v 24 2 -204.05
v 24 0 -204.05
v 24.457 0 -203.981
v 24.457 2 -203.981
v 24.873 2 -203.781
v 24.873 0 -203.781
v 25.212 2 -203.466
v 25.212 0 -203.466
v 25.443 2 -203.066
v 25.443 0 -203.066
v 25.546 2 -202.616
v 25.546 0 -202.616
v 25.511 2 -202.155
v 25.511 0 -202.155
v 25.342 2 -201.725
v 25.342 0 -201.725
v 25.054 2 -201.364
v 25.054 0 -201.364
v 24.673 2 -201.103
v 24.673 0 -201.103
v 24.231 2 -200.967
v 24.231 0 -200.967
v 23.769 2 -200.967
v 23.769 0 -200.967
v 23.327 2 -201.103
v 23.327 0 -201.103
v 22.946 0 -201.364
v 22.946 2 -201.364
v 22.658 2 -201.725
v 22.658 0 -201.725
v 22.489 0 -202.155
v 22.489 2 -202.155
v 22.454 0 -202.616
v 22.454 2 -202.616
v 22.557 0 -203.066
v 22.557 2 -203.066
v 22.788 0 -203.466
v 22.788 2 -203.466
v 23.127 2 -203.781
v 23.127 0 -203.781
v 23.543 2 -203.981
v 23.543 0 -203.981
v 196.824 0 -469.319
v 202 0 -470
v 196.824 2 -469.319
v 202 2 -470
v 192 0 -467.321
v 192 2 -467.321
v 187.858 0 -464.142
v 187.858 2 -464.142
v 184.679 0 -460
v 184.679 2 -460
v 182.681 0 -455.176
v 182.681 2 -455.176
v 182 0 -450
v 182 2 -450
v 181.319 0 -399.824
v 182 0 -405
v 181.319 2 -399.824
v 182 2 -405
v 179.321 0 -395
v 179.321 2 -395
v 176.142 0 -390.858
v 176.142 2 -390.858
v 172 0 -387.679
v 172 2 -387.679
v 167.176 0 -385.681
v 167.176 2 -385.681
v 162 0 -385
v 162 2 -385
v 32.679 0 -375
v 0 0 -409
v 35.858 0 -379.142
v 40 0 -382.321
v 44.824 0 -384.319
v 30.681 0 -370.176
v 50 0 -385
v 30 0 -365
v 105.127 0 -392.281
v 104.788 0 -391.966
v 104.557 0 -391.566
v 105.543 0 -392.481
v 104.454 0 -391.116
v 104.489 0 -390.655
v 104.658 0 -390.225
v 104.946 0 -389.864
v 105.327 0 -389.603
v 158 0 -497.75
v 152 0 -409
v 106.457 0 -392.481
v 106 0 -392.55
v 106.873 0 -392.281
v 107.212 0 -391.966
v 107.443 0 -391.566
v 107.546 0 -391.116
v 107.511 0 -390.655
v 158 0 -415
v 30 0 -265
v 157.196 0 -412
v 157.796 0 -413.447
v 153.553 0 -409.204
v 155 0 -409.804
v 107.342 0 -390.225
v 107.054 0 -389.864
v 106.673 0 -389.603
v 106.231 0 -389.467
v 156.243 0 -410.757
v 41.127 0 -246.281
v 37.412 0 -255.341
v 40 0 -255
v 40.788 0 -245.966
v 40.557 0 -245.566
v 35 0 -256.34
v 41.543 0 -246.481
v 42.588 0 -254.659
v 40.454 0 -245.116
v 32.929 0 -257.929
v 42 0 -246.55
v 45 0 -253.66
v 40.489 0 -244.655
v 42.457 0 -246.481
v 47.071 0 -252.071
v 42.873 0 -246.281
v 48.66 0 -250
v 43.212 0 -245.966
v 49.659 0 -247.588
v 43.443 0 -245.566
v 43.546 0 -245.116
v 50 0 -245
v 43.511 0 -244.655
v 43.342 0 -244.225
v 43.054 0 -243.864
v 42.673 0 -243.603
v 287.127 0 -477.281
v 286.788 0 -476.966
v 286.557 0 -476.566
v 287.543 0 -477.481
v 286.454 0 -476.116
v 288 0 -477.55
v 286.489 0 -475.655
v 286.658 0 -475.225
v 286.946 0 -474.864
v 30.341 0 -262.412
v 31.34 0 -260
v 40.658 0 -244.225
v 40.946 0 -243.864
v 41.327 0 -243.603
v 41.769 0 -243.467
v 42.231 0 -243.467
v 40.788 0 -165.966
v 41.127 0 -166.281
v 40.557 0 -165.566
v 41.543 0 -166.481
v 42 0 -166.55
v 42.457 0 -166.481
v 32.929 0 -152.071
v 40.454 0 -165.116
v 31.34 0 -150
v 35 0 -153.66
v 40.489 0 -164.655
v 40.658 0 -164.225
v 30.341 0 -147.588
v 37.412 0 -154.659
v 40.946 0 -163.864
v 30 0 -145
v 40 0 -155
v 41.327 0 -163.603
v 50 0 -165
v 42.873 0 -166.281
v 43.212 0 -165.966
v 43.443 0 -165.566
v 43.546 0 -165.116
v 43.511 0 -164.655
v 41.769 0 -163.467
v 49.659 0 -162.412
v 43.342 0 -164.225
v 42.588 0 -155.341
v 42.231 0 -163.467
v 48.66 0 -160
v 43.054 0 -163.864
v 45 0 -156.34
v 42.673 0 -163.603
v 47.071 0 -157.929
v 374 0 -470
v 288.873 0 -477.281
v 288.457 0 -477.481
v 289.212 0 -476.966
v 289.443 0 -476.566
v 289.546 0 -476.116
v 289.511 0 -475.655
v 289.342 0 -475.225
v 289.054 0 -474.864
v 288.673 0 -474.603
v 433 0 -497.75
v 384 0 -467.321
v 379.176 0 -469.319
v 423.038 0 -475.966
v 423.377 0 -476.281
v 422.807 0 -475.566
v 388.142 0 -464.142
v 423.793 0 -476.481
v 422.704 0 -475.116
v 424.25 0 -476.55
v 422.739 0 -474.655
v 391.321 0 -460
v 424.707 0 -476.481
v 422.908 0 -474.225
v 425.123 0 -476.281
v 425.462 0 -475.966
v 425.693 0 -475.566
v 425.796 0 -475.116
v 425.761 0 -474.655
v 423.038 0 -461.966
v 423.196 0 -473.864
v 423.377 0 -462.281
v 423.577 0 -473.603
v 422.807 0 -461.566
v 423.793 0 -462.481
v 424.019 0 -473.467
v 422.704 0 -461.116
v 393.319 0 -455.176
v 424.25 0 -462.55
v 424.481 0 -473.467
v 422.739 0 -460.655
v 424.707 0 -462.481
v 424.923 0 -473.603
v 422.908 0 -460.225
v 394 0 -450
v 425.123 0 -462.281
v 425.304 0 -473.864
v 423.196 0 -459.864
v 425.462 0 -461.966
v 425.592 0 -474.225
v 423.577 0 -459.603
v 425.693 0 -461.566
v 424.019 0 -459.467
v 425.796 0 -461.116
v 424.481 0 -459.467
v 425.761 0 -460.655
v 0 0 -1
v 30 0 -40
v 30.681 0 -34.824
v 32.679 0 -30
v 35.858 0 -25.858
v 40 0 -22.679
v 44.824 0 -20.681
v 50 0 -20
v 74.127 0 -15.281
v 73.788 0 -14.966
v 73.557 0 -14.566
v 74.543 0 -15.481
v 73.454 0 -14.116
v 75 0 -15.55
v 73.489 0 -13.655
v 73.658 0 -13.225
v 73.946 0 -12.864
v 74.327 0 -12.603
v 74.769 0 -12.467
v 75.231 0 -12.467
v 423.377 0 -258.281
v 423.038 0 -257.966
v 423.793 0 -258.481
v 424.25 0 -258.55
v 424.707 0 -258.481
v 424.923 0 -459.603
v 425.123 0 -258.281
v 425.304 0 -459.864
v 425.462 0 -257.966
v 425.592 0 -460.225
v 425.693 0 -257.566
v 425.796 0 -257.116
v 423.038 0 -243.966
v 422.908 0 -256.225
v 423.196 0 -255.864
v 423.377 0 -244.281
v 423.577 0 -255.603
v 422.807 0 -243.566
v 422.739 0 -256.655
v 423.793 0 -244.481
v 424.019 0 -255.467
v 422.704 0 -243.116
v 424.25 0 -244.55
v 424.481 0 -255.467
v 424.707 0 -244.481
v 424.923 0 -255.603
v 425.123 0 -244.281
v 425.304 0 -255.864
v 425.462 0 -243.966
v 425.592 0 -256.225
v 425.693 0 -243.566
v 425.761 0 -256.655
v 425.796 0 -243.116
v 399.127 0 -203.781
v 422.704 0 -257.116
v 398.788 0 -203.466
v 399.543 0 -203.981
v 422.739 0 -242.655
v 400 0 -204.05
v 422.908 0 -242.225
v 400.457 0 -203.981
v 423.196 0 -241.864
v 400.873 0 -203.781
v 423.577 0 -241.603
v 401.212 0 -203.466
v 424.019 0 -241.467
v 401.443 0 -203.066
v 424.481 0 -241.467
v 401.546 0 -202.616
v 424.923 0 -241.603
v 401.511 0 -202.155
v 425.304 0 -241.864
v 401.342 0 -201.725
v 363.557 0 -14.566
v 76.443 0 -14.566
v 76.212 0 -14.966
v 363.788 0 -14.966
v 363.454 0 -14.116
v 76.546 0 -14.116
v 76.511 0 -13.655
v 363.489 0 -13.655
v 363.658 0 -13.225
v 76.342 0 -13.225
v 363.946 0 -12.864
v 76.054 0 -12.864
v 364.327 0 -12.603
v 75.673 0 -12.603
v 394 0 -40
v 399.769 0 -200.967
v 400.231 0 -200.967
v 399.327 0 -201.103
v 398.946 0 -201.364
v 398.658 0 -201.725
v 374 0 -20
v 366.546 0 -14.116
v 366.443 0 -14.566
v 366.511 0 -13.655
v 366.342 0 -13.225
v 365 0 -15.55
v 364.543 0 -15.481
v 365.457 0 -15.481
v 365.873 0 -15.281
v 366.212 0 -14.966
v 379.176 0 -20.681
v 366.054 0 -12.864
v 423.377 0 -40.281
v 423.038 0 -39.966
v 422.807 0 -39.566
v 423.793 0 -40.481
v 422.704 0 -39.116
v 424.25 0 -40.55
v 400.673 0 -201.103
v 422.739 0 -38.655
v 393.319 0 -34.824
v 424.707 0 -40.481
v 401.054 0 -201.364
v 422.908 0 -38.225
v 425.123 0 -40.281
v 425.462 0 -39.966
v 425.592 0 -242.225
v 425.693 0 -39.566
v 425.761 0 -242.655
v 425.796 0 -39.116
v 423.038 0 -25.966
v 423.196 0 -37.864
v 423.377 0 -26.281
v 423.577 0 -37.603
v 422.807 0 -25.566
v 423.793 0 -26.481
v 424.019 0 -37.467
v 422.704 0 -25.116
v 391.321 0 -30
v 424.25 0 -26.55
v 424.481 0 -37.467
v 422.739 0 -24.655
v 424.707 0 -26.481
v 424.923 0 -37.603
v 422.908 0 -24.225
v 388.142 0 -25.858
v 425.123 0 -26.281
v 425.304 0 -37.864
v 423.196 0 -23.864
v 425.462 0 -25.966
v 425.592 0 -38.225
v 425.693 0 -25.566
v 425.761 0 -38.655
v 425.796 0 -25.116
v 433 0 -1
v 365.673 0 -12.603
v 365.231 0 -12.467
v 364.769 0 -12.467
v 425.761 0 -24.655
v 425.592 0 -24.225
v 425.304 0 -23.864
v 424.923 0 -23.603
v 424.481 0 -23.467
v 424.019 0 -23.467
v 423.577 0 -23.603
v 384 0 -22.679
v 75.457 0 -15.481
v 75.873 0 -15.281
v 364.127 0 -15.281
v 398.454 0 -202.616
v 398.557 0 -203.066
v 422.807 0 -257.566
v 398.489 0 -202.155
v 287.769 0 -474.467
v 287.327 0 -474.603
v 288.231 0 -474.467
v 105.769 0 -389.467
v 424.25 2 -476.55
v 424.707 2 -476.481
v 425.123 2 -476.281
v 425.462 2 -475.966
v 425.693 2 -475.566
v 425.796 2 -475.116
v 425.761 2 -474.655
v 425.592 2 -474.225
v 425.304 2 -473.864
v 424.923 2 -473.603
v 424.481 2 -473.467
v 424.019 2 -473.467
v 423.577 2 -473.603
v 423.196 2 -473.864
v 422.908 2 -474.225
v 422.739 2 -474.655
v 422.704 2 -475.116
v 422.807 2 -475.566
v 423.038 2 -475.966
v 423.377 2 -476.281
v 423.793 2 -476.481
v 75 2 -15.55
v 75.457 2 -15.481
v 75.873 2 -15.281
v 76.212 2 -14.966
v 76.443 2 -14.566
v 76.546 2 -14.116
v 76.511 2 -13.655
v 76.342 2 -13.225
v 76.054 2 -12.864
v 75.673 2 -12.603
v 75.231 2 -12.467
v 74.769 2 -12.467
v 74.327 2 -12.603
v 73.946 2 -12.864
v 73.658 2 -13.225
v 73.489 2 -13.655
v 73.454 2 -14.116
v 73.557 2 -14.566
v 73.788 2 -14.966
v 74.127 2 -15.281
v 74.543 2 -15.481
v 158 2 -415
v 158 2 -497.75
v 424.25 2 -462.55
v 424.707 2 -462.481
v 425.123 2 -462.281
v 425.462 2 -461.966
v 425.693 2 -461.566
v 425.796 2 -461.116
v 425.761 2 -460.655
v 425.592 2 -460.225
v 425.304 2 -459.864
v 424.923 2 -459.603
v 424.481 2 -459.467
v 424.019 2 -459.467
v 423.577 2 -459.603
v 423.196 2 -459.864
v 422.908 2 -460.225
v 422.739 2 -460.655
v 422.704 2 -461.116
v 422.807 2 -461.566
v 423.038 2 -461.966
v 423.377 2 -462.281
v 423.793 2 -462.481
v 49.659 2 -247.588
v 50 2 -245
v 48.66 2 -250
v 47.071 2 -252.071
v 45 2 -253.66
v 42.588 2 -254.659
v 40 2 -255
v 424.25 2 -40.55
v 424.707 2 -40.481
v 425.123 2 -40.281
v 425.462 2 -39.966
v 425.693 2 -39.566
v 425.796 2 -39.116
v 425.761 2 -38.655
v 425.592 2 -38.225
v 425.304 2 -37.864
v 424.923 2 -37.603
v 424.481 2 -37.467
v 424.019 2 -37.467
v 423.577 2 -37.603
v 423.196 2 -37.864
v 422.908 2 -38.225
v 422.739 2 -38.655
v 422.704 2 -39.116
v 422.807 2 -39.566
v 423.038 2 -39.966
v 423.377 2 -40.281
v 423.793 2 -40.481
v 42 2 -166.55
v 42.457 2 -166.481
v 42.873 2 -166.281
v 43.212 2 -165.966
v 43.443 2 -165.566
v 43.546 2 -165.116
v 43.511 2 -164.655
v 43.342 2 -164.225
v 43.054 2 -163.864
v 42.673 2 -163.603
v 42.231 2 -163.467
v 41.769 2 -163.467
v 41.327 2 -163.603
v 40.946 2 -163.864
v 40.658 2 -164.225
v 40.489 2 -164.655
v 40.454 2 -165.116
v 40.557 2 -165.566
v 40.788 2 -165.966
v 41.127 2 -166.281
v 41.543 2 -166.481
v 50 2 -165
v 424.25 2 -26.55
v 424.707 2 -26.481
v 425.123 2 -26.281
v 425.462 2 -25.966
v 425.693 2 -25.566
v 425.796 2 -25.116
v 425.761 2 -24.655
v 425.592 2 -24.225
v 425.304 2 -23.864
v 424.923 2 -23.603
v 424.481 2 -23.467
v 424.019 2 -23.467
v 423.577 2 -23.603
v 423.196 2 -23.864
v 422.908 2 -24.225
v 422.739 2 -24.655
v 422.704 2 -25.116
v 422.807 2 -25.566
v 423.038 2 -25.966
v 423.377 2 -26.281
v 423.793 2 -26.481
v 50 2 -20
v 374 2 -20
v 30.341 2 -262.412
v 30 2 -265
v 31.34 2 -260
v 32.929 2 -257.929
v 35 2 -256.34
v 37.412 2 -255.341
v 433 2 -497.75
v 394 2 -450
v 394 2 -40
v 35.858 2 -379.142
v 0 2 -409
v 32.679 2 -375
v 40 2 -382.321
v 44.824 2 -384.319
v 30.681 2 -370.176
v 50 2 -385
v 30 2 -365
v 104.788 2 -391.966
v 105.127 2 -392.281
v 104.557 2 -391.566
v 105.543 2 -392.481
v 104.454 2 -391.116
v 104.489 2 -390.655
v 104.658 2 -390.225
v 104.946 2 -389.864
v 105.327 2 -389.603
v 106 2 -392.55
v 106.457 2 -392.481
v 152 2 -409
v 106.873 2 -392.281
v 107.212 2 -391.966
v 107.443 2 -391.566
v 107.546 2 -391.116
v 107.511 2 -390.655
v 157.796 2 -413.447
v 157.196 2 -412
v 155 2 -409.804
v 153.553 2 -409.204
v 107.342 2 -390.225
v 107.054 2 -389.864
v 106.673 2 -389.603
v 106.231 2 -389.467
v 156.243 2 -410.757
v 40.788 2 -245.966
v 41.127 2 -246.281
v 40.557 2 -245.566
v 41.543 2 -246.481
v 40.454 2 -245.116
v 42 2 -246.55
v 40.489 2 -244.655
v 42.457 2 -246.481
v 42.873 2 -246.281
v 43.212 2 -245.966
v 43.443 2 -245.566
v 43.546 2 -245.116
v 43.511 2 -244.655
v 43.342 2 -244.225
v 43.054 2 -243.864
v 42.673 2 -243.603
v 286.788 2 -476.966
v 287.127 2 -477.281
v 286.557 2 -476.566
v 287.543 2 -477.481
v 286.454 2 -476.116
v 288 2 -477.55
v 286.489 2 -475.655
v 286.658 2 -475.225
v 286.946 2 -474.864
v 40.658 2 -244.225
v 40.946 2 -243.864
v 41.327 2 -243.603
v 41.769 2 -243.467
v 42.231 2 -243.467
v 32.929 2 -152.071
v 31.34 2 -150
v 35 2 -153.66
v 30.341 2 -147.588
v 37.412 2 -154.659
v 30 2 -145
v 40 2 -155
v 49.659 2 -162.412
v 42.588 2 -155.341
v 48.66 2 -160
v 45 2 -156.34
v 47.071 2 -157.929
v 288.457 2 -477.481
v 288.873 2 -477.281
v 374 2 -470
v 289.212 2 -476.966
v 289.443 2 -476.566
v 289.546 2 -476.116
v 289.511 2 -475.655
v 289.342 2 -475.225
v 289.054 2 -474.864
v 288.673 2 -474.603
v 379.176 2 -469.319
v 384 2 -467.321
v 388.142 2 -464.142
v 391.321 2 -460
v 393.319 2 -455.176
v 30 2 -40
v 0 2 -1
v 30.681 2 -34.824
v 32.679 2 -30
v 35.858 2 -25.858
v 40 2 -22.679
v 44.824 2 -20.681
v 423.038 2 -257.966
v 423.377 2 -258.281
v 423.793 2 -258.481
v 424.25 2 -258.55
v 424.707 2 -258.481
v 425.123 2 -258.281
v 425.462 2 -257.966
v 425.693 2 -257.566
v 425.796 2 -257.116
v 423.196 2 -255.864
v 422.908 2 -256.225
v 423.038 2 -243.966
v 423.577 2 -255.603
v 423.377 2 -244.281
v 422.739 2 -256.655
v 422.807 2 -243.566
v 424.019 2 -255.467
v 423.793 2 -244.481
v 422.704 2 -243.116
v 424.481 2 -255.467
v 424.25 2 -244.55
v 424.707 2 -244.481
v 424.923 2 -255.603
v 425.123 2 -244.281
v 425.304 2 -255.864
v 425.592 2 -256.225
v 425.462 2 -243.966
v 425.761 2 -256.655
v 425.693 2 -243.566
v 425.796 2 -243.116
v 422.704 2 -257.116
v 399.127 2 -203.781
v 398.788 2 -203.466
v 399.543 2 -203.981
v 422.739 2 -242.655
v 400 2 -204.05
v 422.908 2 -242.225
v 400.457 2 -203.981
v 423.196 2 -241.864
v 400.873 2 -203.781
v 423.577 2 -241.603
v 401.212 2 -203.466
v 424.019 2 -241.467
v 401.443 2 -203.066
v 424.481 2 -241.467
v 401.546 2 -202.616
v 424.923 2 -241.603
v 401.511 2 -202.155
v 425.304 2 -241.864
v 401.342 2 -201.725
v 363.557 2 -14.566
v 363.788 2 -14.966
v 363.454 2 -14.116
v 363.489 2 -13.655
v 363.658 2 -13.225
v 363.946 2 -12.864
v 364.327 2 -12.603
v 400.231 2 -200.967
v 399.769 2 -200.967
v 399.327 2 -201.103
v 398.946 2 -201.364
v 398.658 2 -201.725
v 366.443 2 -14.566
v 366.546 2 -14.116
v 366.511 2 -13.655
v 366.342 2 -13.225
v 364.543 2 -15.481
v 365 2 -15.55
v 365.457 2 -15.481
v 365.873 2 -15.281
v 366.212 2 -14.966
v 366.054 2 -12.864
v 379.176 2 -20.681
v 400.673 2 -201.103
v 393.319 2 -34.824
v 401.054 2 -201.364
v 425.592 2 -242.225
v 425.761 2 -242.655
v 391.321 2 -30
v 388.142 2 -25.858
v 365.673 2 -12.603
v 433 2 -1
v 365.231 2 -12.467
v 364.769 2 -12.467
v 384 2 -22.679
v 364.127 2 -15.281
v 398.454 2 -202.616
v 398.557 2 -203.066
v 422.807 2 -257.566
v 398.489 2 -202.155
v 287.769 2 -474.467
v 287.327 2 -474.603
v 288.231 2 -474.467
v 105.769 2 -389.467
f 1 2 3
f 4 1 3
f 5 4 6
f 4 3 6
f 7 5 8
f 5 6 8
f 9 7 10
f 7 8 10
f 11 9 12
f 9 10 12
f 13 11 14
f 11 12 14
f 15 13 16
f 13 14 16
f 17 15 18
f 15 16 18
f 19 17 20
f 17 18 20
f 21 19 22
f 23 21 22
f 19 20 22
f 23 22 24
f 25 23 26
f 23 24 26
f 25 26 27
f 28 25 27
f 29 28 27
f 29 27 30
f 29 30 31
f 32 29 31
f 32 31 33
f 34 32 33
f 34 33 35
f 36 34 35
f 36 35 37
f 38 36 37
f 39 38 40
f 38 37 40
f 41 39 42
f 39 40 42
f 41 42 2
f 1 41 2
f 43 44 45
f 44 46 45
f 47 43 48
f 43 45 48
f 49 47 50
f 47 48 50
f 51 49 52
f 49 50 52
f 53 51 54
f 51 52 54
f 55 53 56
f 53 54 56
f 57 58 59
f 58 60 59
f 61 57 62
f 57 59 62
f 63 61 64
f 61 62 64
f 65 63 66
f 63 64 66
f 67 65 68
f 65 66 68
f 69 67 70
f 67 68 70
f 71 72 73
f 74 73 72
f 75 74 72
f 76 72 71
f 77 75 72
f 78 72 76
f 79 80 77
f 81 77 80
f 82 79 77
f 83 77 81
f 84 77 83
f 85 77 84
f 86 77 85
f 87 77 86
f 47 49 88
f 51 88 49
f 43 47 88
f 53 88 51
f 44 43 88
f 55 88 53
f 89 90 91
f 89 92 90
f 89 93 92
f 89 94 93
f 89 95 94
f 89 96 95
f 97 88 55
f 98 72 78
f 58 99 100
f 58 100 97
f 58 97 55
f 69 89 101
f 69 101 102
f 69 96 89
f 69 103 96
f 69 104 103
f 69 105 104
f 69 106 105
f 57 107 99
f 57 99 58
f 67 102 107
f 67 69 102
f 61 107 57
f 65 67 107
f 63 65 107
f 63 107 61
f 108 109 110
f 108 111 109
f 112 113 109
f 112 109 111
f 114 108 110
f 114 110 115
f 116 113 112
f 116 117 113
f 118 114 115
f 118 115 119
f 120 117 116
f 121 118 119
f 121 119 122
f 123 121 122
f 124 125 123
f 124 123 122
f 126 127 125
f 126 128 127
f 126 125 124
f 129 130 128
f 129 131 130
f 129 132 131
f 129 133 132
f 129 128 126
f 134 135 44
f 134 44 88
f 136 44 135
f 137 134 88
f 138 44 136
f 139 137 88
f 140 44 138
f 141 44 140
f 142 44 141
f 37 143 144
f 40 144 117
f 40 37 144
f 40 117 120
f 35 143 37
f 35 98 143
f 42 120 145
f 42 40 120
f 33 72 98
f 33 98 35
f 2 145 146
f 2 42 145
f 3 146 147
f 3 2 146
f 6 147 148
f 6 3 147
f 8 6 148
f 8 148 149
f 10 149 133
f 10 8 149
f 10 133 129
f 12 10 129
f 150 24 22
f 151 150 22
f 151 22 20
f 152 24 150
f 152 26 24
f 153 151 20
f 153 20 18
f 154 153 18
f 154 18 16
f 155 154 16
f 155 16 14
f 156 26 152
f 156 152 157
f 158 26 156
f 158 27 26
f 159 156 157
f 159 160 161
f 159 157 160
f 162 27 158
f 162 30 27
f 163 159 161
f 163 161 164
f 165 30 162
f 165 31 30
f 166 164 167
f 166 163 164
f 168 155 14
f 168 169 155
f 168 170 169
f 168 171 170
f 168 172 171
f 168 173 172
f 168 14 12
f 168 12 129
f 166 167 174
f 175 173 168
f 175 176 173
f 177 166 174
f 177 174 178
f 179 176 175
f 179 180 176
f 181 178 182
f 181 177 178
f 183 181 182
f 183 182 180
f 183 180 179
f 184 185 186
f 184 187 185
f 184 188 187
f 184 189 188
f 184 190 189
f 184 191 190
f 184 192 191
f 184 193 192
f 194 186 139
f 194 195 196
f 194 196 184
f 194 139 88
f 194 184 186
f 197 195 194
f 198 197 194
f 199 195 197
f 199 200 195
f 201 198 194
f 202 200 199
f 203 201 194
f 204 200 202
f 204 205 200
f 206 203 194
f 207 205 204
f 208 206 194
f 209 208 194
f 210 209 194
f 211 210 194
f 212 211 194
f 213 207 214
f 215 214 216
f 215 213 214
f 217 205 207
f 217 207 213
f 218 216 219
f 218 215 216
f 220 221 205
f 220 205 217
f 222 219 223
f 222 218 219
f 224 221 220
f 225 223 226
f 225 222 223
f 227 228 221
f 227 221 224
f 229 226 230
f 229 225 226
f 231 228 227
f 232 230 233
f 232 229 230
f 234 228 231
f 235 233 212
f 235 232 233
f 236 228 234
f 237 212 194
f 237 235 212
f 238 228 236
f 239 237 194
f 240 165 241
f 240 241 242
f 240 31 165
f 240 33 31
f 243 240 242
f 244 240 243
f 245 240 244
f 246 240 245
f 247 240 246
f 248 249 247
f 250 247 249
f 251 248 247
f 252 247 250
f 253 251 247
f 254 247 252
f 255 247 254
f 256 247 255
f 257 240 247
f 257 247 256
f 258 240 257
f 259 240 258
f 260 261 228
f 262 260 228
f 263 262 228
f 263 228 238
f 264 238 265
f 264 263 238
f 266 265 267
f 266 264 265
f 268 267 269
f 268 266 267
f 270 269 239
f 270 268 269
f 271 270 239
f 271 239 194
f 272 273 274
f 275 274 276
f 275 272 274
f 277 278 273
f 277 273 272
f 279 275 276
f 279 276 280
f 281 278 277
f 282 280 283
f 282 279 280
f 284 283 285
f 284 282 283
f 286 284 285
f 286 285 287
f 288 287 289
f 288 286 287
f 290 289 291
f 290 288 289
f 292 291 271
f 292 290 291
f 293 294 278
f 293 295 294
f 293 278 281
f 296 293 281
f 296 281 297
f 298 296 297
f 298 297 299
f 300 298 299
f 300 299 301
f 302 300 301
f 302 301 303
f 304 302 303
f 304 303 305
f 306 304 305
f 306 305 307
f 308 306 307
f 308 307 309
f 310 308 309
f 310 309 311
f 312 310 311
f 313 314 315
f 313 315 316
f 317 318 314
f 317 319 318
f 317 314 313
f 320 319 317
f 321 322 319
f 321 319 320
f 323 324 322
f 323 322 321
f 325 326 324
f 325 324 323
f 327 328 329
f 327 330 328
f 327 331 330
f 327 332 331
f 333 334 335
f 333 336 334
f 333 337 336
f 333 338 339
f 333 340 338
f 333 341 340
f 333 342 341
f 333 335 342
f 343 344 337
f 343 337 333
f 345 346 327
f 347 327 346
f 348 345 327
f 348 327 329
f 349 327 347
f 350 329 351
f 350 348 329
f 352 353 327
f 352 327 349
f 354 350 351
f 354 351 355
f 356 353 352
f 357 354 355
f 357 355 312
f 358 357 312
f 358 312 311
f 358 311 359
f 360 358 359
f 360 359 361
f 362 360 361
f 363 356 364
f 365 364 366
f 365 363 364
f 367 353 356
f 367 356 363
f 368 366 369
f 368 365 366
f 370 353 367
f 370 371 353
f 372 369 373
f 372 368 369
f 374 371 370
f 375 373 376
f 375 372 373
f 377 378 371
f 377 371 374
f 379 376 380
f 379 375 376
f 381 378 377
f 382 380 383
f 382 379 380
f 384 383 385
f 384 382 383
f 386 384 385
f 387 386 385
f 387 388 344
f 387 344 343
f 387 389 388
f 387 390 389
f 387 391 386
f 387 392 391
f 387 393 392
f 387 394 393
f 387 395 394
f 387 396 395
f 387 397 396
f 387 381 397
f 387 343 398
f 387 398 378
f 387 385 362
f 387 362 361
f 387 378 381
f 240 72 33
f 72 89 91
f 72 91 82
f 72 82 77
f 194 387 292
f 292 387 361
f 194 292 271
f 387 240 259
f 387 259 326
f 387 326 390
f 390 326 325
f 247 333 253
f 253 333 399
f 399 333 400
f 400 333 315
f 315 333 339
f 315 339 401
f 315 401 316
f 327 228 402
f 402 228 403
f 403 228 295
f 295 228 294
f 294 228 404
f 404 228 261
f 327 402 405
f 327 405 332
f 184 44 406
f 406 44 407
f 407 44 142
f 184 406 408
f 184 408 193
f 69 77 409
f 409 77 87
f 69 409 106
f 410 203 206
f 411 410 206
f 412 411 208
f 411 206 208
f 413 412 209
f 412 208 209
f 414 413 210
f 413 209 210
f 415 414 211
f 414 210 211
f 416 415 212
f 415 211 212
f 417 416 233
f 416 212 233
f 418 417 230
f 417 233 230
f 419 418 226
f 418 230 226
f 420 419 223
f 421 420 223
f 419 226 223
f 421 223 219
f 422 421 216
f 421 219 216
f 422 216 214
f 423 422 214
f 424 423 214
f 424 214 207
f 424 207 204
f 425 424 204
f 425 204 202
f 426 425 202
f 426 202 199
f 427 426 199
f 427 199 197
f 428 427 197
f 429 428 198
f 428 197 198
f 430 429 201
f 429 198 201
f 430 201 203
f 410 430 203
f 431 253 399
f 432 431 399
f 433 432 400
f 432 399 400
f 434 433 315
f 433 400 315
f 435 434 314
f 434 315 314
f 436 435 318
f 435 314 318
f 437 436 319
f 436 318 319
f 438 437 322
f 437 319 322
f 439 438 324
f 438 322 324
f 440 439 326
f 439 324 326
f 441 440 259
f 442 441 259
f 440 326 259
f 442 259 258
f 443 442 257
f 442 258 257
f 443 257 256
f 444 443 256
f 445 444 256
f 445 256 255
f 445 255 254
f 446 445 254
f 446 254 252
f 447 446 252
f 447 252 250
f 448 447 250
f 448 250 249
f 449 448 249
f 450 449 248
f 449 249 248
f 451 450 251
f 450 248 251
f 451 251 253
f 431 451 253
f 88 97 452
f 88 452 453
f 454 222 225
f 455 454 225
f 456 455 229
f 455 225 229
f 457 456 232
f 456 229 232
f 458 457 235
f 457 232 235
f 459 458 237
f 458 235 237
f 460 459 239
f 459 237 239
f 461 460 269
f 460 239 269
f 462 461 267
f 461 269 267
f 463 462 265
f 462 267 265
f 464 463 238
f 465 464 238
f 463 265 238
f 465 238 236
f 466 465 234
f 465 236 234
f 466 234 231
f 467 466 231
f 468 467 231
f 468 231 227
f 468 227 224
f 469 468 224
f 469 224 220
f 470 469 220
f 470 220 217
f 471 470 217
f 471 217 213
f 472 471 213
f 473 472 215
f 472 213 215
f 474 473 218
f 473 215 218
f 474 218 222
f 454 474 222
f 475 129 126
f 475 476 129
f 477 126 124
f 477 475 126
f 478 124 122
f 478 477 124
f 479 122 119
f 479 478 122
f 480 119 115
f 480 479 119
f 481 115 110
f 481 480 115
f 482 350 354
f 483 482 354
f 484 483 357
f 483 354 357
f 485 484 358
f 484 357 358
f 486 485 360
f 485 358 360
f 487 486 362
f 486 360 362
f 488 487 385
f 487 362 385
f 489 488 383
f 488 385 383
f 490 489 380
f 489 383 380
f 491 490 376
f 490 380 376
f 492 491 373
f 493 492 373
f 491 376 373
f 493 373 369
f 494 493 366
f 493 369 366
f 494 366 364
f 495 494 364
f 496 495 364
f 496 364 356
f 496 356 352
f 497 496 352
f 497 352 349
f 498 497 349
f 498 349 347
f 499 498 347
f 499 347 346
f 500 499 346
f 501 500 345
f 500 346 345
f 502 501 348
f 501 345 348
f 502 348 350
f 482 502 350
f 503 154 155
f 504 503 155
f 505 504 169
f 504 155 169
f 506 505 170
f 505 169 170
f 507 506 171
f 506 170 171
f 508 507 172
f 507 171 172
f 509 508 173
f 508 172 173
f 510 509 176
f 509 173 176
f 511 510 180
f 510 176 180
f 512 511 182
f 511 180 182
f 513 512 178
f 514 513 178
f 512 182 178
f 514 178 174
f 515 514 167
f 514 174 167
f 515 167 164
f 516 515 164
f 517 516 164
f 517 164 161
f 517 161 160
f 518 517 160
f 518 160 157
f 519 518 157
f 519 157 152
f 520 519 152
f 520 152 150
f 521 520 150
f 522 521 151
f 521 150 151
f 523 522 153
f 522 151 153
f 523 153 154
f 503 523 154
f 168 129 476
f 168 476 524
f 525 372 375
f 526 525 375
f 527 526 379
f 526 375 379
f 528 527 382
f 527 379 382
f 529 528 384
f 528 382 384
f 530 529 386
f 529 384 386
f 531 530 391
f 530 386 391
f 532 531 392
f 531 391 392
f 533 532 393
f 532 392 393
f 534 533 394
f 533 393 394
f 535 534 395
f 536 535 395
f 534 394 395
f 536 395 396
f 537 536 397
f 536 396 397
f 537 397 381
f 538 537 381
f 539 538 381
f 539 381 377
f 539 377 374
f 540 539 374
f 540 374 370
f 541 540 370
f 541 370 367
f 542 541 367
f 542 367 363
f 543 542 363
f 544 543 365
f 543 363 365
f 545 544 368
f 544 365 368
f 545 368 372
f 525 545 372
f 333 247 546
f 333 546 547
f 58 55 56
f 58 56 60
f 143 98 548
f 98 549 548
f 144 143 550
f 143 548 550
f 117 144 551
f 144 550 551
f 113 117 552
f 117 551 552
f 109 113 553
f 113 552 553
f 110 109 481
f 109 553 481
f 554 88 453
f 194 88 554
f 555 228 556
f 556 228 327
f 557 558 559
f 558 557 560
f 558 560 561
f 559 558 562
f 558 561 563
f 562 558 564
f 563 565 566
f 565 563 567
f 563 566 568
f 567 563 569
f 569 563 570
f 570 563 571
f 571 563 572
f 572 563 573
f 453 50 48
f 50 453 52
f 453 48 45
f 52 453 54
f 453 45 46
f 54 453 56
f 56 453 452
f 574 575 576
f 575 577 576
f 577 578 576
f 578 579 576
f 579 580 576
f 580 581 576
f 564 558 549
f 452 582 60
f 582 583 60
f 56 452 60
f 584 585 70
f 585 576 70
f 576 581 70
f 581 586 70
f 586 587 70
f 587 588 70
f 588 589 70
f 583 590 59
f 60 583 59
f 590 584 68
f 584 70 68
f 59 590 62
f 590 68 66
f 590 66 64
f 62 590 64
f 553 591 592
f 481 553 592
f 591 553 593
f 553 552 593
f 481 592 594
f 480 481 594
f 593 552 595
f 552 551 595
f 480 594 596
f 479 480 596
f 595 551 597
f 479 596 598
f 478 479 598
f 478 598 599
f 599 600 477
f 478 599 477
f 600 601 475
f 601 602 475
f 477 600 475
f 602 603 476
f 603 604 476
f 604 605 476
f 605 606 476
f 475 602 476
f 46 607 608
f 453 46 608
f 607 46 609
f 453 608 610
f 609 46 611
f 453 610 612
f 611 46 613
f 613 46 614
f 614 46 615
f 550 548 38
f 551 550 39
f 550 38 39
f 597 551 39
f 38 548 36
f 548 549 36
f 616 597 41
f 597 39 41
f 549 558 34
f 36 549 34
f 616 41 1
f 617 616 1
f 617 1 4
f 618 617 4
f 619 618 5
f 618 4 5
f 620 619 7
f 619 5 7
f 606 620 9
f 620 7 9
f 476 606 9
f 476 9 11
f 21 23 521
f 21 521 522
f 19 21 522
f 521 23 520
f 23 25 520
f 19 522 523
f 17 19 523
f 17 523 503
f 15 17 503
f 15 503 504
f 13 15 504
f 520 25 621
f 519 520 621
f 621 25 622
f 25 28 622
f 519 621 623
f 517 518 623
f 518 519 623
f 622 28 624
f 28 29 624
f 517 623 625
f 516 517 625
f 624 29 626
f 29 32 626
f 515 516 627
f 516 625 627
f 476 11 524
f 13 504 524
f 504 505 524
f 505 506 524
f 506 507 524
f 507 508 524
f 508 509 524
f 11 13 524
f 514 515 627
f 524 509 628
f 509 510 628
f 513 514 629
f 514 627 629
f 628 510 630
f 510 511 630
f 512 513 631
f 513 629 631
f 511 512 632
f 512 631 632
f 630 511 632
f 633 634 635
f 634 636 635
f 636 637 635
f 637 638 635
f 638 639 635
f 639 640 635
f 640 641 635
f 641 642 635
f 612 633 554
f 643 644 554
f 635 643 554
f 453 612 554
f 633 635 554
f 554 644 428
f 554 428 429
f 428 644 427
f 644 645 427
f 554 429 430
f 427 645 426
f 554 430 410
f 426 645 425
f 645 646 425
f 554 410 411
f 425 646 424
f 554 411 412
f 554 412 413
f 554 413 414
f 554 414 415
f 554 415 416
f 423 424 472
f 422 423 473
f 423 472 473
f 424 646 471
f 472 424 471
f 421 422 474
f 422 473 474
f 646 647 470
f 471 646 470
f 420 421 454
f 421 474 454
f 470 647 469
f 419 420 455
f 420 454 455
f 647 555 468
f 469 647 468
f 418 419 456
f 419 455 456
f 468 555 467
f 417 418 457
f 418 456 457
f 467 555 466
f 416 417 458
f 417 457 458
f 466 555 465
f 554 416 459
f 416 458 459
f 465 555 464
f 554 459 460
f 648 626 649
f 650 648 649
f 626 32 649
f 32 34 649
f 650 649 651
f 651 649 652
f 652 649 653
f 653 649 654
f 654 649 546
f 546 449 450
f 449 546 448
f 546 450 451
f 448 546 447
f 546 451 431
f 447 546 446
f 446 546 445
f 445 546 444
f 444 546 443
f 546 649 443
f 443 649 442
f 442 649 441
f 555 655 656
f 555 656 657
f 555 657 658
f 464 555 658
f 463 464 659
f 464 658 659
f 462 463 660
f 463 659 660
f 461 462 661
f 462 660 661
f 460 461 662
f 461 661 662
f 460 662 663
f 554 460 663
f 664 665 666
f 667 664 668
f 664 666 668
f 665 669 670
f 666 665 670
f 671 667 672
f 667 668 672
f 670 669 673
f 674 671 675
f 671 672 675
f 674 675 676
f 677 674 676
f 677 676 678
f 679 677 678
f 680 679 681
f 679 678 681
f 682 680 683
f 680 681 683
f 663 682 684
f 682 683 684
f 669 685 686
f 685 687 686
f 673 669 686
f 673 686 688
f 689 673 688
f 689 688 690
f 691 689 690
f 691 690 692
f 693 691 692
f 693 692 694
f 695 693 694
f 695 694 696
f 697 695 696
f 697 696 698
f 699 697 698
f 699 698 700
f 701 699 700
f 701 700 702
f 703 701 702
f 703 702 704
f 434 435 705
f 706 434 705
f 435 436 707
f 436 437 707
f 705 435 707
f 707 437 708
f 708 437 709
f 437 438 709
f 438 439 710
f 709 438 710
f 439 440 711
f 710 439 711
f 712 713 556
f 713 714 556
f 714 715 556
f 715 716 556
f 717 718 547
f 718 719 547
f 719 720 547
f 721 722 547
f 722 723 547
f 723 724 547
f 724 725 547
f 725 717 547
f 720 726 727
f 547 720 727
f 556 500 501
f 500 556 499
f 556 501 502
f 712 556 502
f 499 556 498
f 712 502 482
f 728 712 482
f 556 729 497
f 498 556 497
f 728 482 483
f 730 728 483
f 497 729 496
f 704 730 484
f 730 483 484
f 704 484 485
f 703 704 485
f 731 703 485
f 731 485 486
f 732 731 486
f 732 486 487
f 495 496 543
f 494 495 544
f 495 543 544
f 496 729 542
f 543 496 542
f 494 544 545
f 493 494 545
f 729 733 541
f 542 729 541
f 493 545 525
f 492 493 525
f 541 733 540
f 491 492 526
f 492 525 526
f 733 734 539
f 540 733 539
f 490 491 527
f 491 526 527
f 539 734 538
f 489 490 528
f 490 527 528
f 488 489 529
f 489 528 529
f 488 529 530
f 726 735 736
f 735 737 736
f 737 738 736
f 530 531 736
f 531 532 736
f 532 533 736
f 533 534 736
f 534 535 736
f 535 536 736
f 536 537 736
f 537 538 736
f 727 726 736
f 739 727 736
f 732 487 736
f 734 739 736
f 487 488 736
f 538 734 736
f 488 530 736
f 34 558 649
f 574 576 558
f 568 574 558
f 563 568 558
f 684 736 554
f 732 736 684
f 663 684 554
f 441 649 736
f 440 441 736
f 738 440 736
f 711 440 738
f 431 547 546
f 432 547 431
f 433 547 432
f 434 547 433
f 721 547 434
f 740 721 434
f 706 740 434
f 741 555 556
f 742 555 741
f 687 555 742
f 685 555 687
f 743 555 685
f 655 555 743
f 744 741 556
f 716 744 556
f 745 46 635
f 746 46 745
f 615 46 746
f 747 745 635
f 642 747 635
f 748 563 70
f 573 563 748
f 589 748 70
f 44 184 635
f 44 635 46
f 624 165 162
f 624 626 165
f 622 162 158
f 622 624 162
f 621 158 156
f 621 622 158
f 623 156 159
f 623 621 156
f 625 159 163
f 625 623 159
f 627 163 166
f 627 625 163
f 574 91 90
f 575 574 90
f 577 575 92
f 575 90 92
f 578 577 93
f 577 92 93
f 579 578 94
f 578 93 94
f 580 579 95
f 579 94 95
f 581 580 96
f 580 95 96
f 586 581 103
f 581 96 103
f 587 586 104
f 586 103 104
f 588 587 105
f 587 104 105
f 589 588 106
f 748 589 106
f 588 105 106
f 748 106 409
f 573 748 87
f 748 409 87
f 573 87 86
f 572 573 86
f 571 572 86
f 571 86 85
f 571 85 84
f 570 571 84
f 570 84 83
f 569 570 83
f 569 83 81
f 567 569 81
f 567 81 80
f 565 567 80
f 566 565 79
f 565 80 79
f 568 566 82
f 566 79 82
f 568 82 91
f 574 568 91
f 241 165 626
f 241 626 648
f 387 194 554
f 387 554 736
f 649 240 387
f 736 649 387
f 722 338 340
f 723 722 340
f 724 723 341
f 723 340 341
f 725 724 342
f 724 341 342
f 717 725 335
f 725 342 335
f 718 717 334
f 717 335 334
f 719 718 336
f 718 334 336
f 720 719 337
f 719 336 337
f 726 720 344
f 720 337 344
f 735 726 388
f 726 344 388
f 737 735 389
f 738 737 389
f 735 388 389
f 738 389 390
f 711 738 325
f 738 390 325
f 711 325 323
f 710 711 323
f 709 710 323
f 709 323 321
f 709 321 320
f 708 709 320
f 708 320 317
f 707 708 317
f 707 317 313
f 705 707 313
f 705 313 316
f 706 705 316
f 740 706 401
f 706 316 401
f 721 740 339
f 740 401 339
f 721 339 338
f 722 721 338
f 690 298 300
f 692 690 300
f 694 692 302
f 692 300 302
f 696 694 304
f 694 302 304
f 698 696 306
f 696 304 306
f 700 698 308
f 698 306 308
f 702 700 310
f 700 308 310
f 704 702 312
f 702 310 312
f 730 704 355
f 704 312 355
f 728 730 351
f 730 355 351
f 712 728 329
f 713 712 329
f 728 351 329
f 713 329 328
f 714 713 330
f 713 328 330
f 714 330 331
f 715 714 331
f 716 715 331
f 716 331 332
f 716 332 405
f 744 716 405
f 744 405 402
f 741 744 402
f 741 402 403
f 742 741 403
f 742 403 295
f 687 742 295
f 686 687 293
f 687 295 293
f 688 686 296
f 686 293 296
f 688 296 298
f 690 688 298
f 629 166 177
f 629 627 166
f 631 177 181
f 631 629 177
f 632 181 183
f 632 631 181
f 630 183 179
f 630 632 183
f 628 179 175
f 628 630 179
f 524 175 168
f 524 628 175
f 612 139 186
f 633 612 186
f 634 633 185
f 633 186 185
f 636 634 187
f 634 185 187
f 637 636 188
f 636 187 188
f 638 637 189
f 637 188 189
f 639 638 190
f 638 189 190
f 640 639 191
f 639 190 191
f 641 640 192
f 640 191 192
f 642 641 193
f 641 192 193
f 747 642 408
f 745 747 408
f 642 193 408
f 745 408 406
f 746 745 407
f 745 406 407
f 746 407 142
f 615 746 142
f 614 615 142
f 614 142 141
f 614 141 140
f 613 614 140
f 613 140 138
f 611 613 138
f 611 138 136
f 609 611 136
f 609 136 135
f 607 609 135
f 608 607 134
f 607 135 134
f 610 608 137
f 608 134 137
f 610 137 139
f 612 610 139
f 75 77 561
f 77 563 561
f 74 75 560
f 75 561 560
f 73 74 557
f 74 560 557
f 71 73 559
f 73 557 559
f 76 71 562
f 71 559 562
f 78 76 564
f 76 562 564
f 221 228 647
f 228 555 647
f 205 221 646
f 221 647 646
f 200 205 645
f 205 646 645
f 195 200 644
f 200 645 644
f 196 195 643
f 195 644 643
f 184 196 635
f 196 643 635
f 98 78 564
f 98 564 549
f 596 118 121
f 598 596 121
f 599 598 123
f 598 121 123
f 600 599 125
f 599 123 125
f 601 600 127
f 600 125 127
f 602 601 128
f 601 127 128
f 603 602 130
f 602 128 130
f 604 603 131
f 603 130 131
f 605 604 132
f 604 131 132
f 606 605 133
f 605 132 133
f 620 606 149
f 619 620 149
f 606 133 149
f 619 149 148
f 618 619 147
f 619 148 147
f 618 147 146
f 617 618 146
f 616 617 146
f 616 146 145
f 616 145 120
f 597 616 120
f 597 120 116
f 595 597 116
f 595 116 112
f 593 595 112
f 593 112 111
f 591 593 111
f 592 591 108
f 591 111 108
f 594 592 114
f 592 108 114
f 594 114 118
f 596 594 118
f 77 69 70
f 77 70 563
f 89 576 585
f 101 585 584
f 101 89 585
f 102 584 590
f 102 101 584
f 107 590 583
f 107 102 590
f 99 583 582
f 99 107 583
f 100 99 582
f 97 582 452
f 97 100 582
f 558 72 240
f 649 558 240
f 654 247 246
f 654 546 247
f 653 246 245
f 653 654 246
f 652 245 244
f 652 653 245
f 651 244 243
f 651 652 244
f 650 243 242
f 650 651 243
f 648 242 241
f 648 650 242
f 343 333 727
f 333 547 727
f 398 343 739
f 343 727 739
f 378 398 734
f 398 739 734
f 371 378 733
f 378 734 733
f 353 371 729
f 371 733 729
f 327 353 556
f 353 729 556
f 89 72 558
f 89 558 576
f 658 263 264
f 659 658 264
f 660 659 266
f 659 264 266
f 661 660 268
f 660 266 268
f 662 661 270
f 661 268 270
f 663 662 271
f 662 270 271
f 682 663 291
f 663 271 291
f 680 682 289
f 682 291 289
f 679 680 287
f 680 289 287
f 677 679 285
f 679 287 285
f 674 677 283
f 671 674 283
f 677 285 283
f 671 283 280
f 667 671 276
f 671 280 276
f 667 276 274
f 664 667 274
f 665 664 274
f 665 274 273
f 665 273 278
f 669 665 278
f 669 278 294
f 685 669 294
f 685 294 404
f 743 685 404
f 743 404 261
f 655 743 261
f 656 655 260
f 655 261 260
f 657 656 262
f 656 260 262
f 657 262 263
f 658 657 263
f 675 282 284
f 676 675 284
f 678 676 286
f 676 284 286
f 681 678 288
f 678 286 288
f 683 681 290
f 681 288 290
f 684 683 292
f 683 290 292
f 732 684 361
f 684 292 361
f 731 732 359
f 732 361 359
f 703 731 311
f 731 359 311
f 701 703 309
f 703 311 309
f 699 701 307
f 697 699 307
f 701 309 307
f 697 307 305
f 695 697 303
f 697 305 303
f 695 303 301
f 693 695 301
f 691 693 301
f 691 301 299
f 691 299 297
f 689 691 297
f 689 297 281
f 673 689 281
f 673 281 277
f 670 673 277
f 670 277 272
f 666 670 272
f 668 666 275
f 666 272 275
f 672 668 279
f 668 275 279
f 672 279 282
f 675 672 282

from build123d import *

# Parameters (mm, degrees)
CROQUIS1_W              = 434
CROQUIS1_H              = 500
SALIENTE_EXTRUIR1_DEPTH = 2
CROQUIS3_W              = 157
CROQUIS3_H              = 90
CORTAR_EXTRUIR2_DEPTH   = 2
REDONDEO1_R             = 5
CORTAR_EXTRUIR3_DEPTH   = 2
REDONDEO2_R             = 20
CROQUIS6_R              = 1.55
CORTAR_EXTRUIR5_DEPTH   = 2
CROQUIS7_R              = 1.55
CORTAR_EXTRUIR6_DEPTH   = 2
CROQUIS8_W              = 20
CROQUIS8_H              = 100
SALIENTE_EXTRUIR2_DEPTH = 2
REDONDEO3_R             = 10
CROQUIS9_R              = 1.55
CORTAR_EXTRUIR7_DEPTH   = 2
CROQUIS10_OUTSIDE_W     = 568.418
CROQUIS10_OUTSIDE_H     = 634.418
CORTAR_EXTRUIR8_DEPTH   = 10
CROQUIS11_W             = 275
CROQUIS11_H             = 1.25
CORTAR_EXTRUIR9_DEPTH   = 2
CROQUIS12_W             = 1
CROQUIS12_H             = 408
SALIENTE_EXTRUIR3_DEPTH = 2


with BuildPart() as part:
    # Croquis1 → Saliente-Extruir1 (new body)
    with BuildSketch(Plane(origin=(0, 0, 0), x_dir=(1, 0, 0), z_dir=(0, 1, 0))):
        with Locations((217, 250)):
            Rectangle(CROQUIS1_W, CROQUIS1_H)
    extrude(amount=SALIENTE_EXTRUIR1_DEPTH)

    # Croquis3 → Cortar-Extruir2 (cut)
    with BuildSketch(Plane.XZ):
        with Locations((78.5, -455)):
            Rectangle(CROQUIS3_W, CROQUIS3_H)
    extrude(amount=-CORTAR_EXTRUIR2_DEPTH, mode=Mode.SUBTRACT)

    # Redondeo1
    redondeo1_edges = [part.edges().sort_by_distance(p)[0] for p in [
        (157, 1, -410),
    ]]
    fillet(redondeo1_edges, radius=REDONDEO1_R)

    # Croquis4 → Cortar-Extruir3 (cut)
    with BuildSketch(Plane.XZ):
        Polygon((30, -20), (394, -20), (394, -233.661541009), (394, -470), (182, -470), (182, -385), (30, -385), align=None)
    extrude(amount=-CORTAR_EXTRUIR3_DEPTH, mode=Mode.SUBTRACT)

    # Redondeo2
    redondeo2_edges = [part.edges().sort_by_distance(p)[0] for p in [
        (30, 1, -385),
        (30, 1, -20),
        (394, 1, -20),
        (394, 1, -470),
        (182, 1, -470),
        (182, 1, -385),
    ]]
    fillet(redondeo2_edges, radius=REDONDEO2_R)

    # Croquis6 → Cortar-Extruir5 (cut)
    with BuildSketch(Plane.XZ):
        with Locations(Location((75, -14, 0), (0, 0, 270))):
            Circle(CROQUIS6_R)
        with Locations(Location((365, -14, 0), (0, 0, 270))):
            Circle(CROQUIS6_R)
        with Locations(Location((288, -476, 0), (0, 0, 270))):
            Circle(CROQUIS6_R)
        with Locations(Location((106, -391, 0), (0, 0, 270))):
            Circle(CROQUIS6_R)
        with Locations(Location((24, -202.5, 0), (0, 0, 270))):
            Circle(CROQUIS6_R)
        with Locations(Location((400, -202.5, 0), (0, 0, 270))):
            Circle(CROQUIS6_R)
    extrude(amount=-CORTAR_EXTRUIR5_DEPTH, mode=Mode.SUBTRACT)

    # Croquis7 → Cortar-Extruir6 (cut)
    with BuildSketch(Plane.XZ):
        with Locations(Location((424.25, -25, 0), (0, 0, 270))):
            Circle(CROQUIS7_R)
        with Locations(Location((424.25, -39, 0), (0, 0, 270))):
            Circle(CROQUIS7_R)
        with Locations(Location((424.25, -475, 0), (0, 0, 270))):
            Circle(CROQUIS7_R)
        with Locations(Location((424.25, -461, 0), (0, 0, 270))):
            Circle(CROQUIS7_R)
        with Locations(Location((424.25, -243, 0), (0, 0, 270))):
            Circle(CROQUIS7_R)
        with Locations(Location((424.25, -257, 0), (0, 0, 270))):
            Circle(CROQUIS7_R)
    extrude(amount=-CORTAR_EXTRUIR6_DEPTH, mode=Mode.SUBTRACT)

    # Croquis8 → Saliente-Extruir2 (add)
    with BuildSketch(Plane.XZ):
        with Locations((40, -205)):
            Rectangle(CROQUIS8_W, CROQUIS8_H)
    extrude(amount=-SALIENTE_EXTRUIR2_DEPTH)

    # Redondeo3
    redondeo3_edges = [part.edges().sort_by_distance(p)[0] for p in [
        (30, 1, -255),
        (30, 1, -155),
    ]]
    fillet(redondeo3_edges, radius=REDONDEO3_R)
    redondeo3_2_edges = [part.edges().sort_by_distance(p)[0] for p in [
        (50, 1, -255),
        (50, 1, -155),
    ]]
    fillet(redondeo3_2_edges, radius=REDONDEO3_R - 0.0001)  # a hair under: the kernel refuses the full size

    # Croquis9 → Cortar-Extruir7 (cut)
    with BuildSketch(Plane.XZ):
        with Locations(Location((42, -165, 0), (0, 0, 270))):
            Circle(CROQUIS9_R)
        with Locations(Location((42, -245, 0), (0, 0, 270))):
            Circle(CROQUIS9_R)
    extrude(amount=-CORTAR_EXTRUIR7_DEPTH, mode=Mode.SUBTRACT)

    # Croquis10 outside → Cortar-Extruir8 (cut)
    with BuildSketch(Plane.XZ):
        with Locations((217, -250)):
            Rectangle(CROQUIS10_OUTSIDE_W, CROQUIS10_OUTSIDE_H)
        with BuildLine():
            Line((1, -409), (152, -409))
            ThreePointArc((152, -409), (156.242640687, -410.757359313), (158, -415))
            Line((158, -415), (158, -499))
            Line((158, -499), (433, -499))
            Line((433, -499), (433, -1))
            Line((433, -1), (1, -1))
            Line((1, -1), (1, -409))
        make_face(mode=Mode.SUBTRACT)
    extrude(amount=-CORTAR_EXTRUIR8_DEPTH, mode=Mode.SUBTRACT)

    # Croquis11 → Cortar-Extruir9 (cut)
    with BuildSketch(Plane.XZ):
        with Locations((295.5, -498.375)):
            Rectangle(CROQUIS11_W, CROQUIS11_H)
    extrude(amount=-CORTAR_EXTRUIR9_DEPTH, mode=Mode.SUBTRACT)

    # Croquis12 → Saliente-Extruir3 (add)
    with BuildSketch(Plane.XZ):
        with Locations((0.5, -205)):
            Rectangle(CROQUIS12_W, CROQUIS12_H)
    extrude(amount=-SALIENTE_EXTRUIR3_DEPTH)


solid = part.part
